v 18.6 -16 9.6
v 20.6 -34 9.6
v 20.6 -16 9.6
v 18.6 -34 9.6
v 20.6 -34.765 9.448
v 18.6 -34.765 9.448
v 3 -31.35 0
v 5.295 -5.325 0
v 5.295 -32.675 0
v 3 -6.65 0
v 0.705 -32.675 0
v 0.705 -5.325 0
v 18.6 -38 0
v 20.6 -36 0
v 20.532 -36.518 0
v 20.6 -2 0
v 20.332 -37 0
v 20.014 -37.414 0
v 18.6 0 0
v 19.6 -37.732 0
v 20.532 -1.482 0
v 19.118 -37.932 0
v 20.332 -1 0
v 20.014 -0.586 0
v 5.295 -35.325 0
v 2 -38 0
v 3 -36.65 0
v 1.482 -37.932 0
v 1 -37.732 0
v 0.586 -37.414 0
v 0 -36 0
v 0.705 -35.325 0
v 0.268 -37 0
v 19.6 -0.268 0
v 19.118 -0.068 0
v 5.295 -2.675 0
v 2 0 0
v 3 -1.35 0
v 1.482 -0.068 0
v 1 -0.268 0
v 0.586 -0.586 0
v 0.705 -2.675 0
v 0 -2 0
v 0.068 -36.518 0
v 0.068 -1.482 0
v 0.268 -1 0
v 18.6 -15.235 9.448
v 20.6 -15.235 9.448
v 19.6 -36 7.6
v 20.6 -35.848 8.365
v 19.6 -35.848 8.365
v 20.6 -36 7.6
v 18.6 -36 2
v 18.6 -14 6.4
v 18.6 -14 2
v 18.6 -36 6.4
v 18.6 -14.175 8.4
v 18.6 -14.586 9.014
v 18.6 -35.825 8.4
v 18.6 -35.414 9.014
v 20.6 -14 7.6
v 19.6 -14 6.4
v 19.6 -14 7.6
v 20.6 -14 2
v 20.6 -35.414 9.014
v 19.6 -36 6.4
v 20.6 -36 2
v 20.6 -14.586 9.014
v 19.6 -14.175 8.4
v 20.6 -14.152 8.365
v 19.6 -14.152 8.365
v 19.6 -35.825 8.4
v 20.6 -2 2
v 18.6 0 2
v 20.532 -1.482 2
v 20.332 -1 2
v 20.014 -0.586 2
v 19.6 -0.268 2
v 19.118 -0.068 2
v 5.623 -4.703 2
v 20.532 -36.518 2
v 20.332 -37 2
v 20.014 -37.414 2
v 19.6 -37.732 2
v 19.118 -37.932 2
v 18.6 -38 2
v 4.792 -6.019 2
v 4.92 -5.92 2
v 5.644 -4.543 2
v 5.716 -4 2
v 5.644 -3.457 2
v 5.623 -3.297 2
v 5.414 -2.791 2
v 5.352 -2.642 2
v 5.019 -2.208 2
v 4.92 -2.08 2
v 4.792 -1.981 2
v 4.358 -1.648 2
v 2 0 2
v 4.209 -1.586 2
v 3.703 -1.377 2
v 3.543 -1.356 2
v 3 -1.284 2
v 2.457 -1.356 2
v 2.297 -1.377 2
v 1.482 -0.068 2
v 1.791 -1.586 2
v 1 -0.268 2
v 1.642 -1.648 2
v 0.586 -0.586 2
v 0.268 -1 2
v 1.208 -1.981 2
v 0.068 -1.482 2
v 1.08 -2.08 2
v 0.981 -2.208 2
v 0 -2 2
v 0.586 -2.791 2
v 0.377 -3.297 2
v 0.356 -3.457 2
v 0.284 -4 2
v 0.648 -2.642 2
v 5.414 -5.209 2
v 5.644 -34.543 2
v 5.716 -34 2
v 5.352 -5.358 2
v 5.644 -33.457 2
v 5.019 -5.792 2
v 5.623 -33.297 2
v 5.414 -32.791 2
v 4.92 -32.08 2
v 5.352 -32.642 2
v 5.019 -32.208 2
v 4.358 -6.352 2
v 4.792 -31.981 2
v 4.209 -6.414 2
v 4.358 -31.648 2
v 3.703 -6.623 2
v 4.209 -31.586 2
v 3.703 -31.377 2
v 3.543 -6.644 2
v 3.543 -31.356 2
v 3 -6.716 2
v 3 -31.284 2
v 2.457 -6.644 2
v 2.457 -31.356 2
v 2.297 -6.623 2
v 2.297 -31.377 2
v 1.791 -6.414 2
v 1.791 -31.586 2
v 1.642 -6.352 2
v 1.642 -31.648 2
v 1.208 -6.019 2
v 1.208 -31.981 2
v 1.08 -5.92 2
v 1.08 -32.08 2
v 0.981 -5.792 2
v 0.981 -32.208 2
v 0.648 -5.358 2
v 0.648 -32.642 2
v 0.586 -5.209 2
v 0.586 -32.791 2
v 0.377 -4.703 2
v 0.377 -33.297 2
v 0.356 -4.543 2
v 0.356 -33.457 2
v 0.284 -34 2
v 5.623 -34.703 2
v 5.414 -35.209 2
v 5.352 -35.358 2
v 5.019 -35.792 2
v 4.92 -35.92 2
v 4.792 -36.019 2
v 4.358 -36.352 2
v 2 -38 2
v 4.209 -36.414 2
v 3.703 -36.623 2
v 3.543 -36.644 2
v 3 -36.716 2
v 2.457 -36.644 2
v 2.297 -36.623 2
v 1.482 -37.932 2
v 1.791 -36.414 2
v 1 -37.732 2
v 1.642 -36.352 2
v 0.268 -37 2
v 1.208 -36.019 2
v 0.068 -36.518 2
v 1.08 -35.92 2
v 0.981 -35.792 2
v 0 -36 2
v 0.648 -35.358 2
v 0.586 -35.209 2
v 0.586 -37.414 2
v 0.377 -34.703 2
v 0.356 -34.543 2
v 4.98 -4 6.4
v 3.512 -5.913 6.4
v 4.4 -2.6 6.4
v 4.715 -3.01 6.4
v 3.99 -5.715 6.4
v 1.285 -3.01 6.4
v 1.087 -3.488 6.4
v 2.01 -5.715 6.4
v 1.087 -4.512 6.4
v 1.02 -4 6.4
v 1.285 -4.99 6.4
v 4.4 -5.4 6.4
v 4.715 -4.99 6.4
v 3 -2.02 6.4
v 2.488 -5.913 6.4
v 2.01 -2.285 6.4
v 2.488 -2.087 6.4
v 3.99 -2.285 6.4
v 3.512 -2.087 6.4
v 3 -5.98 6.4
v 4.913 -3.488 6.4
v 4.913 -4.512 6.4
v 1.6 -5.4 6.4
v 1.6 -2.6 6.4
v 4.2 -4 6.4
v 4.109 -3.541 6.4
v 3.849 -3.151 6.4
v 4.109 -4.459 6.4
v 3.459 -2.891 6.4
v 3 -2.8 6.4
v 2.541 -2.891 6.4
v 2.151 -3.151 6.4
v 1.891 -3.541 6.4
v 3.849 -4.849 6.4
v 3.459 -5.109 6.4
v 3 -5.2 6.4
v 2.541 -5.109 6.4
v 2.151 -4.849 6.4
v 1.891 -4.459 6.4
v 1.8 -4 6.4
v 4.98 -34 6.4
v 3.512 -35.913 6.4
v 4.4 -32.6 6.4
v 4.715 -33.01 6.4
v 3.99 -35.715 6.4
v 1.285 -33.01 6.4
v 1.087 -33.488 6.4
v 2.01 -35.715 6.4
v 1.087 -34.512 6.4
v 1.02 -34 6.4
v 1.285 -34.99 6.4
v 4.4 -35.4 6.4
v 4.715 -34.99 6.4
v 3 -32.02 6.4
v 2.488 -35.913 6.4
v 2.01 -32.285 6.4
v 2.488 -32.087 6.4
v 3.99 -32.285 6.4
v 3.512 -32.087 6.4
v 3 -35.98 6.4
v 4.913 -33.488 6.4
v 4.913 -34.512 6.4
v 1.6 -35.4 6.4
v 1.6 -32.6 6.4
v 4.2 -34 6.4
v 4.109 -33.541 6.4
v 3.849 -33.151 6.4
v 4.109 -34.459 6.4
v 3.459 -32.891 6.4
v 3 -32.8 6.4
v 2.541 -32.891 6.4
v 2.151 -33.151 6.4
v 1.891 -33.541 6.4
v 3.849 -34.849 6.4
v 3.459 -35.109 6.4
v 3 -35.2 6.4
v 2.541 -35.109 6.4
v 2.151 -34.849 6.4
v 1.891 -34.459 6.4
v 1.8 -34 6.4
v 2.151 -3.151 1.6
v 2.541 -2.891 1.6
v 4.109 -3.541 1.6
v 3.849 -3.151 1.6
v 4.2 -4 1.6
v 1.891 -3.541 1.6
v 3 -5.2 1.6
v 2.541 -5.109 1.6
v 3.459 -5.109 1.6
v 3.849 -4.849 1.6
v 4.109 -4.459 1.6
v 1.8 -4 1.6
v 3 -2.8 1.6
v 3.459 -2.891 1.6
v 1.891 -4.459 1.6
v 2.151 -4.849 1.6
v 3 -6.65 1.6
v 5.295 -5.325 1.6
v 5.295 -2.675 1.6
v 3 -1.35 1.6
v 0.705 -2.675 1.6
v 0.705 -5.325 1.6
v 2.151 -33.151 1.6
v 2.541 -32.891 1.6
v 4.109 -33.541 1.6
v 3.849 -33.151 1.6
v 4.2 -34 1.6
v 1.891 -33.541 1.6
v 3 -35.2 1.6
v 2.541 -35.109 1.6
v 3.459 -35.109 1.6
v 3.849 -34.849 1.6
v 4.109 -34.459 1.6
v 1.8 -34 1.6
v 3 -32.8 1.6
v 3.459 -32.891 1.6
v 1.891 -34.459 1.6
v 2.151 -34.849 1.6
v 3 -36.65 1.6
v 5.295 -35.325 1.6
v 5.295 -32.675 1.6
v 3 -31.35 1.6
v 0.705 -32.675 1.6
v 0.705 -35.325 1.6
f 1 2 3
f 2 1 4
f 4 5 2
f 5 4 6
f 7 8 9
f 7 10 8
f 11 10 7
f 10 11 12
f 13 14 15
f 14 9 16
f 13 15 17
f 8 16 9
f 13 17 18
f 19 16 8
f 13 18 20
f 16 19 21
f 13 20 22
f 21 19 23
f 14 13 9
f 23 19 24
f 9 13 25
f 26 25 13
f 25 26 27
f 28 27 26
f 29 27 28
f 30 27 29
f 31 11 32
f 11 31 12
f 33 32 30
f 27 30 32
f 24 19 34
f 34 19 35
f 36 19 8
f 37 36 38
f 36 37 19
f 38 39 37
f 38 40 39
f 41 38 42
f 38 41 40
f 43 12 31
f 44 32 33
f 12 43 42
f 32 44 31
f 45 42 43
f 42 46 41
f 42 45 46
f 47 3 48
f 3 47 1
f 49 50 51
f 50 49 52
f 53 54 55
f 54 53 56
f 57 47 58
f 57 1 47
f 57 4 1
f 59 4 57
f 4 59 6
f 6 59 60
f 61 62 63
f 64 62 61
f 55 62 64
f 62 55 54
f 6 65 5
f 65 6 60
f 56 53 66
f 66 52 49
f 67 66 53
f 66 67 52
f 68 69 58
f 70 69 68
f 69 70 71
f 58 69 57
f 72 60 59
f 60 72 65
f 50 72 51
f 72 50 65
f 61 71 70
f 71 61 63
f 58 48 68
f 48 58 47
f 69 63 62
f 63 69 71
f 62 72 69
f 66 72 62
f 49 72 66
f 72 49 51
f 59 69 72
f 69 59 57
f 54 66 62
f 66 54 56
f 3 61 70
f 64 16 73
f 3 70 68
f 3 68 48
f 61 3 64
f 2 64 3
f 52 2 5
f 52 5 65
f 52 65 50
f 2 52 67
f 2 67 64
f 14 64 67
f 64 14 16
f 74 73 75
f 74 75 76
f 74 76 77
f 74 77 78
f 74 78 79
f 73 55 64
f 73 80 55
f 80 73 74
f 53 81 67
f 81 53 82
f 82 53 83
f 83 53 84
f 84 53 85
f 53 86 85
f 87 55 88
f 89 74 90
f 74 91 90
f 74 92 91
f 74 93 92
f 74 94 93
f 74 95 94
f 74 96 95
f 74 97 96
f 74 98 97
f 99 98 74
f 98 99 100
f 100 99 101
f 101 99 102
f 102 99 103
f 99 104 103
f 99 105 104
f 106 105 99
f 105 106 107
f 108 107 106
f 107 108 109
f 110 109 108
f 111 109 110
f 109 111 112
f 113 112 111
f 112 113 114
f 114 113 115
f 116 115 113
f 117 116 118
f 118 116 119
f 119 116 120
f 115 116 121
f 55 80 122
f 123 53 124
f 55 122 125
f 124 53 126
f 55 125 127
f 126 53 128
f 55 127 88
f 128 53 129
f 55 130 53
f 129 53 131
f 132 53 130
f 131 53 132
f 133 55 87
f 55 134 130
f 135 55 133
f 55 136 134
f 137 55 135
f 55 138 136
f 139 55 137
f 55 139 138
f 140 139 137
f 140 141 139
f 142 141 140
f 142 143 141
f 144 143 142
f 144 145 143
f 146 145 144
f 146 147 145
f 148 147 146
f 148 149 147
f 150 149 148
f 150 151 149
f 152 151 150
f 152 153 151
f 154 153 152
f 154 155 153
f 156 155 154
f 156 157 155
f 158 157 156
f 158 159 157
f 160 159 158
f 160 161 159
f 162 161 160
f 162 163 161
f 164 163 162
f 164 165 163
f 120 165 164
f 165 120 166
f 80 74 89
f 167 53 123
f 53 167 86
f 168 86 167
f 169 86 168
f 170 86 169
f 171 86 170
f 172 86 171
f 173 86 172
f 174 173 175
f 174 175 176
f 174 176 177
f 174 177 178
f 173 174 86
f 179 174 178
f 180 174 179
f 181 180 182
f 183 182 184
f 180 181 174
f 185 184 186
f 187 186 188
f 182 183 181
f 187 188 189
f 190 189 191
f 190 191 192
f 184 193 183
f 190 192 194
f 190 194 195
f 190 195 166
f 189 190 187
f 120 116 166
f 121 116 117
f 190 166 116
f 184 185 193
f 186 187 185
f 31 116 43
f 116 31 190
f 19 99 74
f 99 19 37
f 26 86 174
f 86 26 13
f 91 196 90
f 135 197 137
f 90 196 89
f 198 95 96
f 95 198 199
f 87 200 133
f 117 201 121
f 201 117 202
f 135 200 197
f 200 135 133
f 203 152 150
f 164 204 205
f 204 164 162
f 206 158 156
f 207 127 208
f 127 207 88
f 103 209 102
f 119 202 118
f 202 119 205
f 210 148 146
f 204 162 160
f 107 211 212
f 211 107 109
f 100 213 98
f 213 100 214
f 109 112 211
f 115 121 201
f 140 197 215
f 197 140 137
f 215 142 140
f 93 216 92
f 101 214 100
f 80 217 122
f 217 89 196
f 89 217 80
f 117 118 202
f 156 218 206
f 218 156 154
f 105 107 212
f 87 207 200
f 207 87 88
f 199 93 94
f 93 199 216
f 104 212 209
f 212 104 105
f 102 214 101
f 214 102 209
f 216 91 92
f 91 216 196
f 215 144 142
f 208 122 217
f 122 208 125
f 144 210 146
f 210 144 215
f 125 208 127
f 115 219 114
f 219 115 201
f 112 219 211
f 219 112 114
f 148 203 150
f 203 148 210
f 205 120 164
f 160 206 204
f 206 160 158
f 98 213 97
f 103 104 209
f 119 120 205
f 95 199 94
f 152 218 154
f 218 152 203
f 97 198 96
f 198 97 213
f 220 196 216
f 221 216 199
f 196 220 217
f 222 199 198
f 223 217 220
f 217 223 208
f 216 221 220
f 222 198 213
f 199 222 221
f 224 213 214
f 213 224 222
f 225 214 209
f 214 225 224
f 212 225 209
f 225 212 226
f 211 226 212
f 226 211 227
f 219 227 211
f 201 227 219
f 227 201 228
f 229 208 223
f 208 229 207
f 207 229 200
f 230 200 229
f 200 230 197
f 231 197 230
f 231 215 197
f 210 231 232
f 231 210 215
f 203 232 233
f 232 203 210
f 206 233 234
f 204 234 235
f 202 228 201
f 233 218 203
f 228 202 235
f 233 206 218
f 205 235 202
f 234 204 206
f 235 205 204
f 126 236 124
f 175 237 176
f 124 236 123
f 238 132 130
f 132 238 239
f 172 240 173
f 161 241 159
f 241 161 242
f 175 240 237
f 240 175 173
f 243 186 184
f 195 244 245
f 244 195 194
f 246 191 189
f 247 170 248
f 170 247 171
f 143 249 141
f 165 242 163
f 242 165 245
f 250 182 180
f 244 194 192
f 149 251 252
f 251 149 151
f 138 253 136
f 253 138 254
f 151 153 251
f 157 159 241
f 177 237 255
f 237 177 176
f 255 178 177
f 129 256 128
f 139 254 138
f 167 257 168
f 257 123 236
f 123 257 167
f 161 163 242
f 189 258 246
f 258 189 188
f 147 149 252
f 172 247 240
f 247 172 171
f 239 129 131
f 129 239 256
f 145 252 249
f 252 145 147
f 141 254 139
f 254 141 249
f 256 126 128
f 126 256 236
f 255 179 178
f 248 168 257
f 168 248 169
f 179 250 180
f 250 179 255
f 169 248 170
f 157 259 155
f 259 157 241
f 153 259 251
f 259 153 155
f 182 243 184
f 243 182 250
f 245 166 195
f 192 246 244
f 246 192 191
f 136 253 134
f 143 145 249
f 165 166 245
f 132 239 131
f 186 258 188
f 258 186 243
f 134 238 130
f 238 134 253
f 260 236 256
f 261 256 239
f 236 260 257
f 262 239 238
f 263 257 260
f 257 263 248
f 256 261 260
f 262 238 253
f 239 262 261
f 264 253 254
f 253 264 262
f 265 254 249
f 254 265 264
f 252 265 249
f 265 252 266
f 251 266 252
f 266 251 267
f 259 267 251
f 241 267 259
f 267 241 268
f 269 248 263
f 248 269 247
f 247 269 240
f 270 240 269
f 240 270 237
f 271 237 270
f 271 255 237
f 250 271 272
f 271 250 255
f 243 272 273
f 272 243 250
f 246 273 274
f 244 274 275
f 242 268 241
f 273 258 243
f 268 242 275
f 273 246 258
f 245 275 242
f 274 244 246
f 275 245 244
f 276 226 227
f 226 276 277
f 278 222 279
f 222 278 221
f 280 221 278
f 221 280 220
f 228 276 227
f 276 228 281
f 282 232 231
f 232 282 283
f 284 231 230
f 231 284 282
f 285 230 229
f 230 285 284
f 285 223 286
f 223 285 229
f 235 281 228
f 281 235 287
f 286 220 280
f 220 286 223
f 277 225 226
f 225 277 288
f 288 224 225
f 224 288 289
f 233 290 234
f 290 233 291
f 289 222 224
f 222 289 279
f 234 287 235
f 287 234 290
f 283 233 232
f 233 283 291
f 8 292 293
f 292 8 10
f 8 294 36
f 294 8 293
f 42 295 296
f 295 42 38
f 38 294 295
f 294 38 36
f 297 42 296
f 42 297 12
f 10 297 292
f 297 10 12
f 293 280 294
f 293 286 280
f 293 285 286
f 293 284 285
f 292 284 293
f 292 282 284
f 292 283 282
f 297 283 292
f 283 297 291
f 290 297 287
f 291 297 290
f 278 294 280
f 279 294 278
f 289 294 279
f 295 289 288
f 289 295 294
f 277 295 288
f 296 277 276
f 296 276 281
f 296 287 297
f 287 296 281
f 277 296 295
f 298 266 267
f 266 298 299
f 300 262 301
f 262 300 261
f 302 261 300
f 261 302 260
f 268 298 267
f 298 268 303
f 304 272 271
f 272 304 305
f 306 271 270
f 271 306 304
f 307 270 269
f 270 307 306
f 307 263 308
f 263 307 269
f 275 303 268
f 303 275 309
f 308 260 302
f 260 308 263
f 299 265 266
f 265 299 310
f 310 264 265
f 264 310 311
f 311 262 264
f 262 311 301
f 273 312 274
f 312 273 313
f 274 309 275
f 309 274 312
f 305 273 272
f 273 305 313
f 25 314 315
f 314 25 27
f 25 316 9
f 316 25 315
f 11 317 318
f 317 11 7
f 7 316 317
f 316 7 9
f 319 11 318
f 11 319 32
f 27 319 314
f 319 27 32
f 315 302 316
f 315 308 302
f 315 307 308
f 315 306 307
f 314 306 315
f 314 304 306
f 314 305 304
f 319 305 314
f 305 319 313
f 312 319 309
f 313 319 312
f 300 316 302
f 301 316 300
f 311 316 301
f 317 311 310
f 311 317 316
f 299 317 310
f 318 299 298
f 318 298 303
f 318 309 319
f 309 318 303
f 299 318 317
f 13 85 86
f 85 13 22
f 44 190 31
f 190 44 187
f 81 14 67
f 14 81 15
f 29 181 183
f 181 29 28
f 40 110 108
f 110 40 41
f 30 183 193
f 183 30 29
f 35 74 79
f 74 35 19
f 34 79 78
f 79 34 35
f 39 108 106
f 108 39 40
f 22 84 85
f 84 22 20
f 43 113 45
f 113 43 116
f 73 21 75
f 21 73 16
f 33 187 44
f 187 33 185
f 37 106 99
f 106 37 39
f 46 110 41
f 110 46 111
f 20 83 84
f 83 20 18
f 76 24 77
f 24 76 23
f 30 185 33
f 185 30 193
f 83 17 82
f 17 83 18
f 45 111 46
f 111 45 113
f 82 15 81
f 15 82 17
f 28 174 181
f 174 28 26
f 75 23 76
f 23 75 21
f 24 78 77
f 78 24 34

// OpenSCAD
// Mounting plate for MailboxLight PCB
// Adrian McCarthy 2020-11-03

pcb_th = 1.6; // thickness of the PCB board (typical FR4 laminate thickness)
screw_l = 8;  // length of screw (excluding the head)
screw_d = 2.4;  // M2 screw
nut_h = 1.6;  // M2 hex nut
nut_d = 5.3;

plate_th = 2;

module rounded_plate(dimensions=false, corners=false, h=1, radius=0.5) {
    points = (corners == false) ?
        [[radius, radius],
         [dimensions[0] - radius, radius],
         [dimensions[0] - radius, dimensions[1] - radius],
         [radius, dimensions[1] - radius]] :
        corners;
    hull() {
        for (p=points) {
            translate(p) cylinder(r=radius, h=h);
        }
    }
}

intersection() {
    difference() {
        union() {
            // build plate
            translate([0, -38, 0]) cube([20.6, 38, plate_th]);

            // bosses
            d = max(nut_d + 0.8, 1.75*screw_d);
            translate([3, -4, 0])
                cylinder(d1=d, d2=1.65*screw_d, h=screw_l-pcb_th, $fn=24);
            translate([3, -34, 0])
                cylinder(d1=d, d2=1.65*screw_d, h=screw_l-pcb_th, $fn=24);

            // support ledge
            translate([18.6, -36, 0]) difference() {
                translate([2, 0, 0]) rotate([0, -90, 0])
                    rounded_plate([screw_l + 1.6, 22], h=2, radius=2, $fn=16);
                translate([-1, -1, screw_l-pcb_th]) cube([2, 24, pcb_th + 0.4]);
            }
        }

        // Bore screw holes through the bosses and add pockets for
        // hex nuts.
        translate([3, -4, -0.1]) {
            cylinder(d=screw_d, h=screw_l-pcb_th+0.2, $fn=16);
            rotate([0, 0, 30]) cylinder(d=nut_d, h=nut_h+0.1, $fn=6);
        }
        translate([3, -34, -0.1]) {
            cylinder(d=screw_d, h=screw_l-pcb_th+0.2, $fn=16);
            rotate([0, 0, 30]) cylinder(d=nut_d, h=nut_h+0.1, $fn=6);
        }
    }
    translate([0, -38, 0]) rounded_plate([20.6, 38], h=screw_l + 2, radius=2, $fn=24);
}
